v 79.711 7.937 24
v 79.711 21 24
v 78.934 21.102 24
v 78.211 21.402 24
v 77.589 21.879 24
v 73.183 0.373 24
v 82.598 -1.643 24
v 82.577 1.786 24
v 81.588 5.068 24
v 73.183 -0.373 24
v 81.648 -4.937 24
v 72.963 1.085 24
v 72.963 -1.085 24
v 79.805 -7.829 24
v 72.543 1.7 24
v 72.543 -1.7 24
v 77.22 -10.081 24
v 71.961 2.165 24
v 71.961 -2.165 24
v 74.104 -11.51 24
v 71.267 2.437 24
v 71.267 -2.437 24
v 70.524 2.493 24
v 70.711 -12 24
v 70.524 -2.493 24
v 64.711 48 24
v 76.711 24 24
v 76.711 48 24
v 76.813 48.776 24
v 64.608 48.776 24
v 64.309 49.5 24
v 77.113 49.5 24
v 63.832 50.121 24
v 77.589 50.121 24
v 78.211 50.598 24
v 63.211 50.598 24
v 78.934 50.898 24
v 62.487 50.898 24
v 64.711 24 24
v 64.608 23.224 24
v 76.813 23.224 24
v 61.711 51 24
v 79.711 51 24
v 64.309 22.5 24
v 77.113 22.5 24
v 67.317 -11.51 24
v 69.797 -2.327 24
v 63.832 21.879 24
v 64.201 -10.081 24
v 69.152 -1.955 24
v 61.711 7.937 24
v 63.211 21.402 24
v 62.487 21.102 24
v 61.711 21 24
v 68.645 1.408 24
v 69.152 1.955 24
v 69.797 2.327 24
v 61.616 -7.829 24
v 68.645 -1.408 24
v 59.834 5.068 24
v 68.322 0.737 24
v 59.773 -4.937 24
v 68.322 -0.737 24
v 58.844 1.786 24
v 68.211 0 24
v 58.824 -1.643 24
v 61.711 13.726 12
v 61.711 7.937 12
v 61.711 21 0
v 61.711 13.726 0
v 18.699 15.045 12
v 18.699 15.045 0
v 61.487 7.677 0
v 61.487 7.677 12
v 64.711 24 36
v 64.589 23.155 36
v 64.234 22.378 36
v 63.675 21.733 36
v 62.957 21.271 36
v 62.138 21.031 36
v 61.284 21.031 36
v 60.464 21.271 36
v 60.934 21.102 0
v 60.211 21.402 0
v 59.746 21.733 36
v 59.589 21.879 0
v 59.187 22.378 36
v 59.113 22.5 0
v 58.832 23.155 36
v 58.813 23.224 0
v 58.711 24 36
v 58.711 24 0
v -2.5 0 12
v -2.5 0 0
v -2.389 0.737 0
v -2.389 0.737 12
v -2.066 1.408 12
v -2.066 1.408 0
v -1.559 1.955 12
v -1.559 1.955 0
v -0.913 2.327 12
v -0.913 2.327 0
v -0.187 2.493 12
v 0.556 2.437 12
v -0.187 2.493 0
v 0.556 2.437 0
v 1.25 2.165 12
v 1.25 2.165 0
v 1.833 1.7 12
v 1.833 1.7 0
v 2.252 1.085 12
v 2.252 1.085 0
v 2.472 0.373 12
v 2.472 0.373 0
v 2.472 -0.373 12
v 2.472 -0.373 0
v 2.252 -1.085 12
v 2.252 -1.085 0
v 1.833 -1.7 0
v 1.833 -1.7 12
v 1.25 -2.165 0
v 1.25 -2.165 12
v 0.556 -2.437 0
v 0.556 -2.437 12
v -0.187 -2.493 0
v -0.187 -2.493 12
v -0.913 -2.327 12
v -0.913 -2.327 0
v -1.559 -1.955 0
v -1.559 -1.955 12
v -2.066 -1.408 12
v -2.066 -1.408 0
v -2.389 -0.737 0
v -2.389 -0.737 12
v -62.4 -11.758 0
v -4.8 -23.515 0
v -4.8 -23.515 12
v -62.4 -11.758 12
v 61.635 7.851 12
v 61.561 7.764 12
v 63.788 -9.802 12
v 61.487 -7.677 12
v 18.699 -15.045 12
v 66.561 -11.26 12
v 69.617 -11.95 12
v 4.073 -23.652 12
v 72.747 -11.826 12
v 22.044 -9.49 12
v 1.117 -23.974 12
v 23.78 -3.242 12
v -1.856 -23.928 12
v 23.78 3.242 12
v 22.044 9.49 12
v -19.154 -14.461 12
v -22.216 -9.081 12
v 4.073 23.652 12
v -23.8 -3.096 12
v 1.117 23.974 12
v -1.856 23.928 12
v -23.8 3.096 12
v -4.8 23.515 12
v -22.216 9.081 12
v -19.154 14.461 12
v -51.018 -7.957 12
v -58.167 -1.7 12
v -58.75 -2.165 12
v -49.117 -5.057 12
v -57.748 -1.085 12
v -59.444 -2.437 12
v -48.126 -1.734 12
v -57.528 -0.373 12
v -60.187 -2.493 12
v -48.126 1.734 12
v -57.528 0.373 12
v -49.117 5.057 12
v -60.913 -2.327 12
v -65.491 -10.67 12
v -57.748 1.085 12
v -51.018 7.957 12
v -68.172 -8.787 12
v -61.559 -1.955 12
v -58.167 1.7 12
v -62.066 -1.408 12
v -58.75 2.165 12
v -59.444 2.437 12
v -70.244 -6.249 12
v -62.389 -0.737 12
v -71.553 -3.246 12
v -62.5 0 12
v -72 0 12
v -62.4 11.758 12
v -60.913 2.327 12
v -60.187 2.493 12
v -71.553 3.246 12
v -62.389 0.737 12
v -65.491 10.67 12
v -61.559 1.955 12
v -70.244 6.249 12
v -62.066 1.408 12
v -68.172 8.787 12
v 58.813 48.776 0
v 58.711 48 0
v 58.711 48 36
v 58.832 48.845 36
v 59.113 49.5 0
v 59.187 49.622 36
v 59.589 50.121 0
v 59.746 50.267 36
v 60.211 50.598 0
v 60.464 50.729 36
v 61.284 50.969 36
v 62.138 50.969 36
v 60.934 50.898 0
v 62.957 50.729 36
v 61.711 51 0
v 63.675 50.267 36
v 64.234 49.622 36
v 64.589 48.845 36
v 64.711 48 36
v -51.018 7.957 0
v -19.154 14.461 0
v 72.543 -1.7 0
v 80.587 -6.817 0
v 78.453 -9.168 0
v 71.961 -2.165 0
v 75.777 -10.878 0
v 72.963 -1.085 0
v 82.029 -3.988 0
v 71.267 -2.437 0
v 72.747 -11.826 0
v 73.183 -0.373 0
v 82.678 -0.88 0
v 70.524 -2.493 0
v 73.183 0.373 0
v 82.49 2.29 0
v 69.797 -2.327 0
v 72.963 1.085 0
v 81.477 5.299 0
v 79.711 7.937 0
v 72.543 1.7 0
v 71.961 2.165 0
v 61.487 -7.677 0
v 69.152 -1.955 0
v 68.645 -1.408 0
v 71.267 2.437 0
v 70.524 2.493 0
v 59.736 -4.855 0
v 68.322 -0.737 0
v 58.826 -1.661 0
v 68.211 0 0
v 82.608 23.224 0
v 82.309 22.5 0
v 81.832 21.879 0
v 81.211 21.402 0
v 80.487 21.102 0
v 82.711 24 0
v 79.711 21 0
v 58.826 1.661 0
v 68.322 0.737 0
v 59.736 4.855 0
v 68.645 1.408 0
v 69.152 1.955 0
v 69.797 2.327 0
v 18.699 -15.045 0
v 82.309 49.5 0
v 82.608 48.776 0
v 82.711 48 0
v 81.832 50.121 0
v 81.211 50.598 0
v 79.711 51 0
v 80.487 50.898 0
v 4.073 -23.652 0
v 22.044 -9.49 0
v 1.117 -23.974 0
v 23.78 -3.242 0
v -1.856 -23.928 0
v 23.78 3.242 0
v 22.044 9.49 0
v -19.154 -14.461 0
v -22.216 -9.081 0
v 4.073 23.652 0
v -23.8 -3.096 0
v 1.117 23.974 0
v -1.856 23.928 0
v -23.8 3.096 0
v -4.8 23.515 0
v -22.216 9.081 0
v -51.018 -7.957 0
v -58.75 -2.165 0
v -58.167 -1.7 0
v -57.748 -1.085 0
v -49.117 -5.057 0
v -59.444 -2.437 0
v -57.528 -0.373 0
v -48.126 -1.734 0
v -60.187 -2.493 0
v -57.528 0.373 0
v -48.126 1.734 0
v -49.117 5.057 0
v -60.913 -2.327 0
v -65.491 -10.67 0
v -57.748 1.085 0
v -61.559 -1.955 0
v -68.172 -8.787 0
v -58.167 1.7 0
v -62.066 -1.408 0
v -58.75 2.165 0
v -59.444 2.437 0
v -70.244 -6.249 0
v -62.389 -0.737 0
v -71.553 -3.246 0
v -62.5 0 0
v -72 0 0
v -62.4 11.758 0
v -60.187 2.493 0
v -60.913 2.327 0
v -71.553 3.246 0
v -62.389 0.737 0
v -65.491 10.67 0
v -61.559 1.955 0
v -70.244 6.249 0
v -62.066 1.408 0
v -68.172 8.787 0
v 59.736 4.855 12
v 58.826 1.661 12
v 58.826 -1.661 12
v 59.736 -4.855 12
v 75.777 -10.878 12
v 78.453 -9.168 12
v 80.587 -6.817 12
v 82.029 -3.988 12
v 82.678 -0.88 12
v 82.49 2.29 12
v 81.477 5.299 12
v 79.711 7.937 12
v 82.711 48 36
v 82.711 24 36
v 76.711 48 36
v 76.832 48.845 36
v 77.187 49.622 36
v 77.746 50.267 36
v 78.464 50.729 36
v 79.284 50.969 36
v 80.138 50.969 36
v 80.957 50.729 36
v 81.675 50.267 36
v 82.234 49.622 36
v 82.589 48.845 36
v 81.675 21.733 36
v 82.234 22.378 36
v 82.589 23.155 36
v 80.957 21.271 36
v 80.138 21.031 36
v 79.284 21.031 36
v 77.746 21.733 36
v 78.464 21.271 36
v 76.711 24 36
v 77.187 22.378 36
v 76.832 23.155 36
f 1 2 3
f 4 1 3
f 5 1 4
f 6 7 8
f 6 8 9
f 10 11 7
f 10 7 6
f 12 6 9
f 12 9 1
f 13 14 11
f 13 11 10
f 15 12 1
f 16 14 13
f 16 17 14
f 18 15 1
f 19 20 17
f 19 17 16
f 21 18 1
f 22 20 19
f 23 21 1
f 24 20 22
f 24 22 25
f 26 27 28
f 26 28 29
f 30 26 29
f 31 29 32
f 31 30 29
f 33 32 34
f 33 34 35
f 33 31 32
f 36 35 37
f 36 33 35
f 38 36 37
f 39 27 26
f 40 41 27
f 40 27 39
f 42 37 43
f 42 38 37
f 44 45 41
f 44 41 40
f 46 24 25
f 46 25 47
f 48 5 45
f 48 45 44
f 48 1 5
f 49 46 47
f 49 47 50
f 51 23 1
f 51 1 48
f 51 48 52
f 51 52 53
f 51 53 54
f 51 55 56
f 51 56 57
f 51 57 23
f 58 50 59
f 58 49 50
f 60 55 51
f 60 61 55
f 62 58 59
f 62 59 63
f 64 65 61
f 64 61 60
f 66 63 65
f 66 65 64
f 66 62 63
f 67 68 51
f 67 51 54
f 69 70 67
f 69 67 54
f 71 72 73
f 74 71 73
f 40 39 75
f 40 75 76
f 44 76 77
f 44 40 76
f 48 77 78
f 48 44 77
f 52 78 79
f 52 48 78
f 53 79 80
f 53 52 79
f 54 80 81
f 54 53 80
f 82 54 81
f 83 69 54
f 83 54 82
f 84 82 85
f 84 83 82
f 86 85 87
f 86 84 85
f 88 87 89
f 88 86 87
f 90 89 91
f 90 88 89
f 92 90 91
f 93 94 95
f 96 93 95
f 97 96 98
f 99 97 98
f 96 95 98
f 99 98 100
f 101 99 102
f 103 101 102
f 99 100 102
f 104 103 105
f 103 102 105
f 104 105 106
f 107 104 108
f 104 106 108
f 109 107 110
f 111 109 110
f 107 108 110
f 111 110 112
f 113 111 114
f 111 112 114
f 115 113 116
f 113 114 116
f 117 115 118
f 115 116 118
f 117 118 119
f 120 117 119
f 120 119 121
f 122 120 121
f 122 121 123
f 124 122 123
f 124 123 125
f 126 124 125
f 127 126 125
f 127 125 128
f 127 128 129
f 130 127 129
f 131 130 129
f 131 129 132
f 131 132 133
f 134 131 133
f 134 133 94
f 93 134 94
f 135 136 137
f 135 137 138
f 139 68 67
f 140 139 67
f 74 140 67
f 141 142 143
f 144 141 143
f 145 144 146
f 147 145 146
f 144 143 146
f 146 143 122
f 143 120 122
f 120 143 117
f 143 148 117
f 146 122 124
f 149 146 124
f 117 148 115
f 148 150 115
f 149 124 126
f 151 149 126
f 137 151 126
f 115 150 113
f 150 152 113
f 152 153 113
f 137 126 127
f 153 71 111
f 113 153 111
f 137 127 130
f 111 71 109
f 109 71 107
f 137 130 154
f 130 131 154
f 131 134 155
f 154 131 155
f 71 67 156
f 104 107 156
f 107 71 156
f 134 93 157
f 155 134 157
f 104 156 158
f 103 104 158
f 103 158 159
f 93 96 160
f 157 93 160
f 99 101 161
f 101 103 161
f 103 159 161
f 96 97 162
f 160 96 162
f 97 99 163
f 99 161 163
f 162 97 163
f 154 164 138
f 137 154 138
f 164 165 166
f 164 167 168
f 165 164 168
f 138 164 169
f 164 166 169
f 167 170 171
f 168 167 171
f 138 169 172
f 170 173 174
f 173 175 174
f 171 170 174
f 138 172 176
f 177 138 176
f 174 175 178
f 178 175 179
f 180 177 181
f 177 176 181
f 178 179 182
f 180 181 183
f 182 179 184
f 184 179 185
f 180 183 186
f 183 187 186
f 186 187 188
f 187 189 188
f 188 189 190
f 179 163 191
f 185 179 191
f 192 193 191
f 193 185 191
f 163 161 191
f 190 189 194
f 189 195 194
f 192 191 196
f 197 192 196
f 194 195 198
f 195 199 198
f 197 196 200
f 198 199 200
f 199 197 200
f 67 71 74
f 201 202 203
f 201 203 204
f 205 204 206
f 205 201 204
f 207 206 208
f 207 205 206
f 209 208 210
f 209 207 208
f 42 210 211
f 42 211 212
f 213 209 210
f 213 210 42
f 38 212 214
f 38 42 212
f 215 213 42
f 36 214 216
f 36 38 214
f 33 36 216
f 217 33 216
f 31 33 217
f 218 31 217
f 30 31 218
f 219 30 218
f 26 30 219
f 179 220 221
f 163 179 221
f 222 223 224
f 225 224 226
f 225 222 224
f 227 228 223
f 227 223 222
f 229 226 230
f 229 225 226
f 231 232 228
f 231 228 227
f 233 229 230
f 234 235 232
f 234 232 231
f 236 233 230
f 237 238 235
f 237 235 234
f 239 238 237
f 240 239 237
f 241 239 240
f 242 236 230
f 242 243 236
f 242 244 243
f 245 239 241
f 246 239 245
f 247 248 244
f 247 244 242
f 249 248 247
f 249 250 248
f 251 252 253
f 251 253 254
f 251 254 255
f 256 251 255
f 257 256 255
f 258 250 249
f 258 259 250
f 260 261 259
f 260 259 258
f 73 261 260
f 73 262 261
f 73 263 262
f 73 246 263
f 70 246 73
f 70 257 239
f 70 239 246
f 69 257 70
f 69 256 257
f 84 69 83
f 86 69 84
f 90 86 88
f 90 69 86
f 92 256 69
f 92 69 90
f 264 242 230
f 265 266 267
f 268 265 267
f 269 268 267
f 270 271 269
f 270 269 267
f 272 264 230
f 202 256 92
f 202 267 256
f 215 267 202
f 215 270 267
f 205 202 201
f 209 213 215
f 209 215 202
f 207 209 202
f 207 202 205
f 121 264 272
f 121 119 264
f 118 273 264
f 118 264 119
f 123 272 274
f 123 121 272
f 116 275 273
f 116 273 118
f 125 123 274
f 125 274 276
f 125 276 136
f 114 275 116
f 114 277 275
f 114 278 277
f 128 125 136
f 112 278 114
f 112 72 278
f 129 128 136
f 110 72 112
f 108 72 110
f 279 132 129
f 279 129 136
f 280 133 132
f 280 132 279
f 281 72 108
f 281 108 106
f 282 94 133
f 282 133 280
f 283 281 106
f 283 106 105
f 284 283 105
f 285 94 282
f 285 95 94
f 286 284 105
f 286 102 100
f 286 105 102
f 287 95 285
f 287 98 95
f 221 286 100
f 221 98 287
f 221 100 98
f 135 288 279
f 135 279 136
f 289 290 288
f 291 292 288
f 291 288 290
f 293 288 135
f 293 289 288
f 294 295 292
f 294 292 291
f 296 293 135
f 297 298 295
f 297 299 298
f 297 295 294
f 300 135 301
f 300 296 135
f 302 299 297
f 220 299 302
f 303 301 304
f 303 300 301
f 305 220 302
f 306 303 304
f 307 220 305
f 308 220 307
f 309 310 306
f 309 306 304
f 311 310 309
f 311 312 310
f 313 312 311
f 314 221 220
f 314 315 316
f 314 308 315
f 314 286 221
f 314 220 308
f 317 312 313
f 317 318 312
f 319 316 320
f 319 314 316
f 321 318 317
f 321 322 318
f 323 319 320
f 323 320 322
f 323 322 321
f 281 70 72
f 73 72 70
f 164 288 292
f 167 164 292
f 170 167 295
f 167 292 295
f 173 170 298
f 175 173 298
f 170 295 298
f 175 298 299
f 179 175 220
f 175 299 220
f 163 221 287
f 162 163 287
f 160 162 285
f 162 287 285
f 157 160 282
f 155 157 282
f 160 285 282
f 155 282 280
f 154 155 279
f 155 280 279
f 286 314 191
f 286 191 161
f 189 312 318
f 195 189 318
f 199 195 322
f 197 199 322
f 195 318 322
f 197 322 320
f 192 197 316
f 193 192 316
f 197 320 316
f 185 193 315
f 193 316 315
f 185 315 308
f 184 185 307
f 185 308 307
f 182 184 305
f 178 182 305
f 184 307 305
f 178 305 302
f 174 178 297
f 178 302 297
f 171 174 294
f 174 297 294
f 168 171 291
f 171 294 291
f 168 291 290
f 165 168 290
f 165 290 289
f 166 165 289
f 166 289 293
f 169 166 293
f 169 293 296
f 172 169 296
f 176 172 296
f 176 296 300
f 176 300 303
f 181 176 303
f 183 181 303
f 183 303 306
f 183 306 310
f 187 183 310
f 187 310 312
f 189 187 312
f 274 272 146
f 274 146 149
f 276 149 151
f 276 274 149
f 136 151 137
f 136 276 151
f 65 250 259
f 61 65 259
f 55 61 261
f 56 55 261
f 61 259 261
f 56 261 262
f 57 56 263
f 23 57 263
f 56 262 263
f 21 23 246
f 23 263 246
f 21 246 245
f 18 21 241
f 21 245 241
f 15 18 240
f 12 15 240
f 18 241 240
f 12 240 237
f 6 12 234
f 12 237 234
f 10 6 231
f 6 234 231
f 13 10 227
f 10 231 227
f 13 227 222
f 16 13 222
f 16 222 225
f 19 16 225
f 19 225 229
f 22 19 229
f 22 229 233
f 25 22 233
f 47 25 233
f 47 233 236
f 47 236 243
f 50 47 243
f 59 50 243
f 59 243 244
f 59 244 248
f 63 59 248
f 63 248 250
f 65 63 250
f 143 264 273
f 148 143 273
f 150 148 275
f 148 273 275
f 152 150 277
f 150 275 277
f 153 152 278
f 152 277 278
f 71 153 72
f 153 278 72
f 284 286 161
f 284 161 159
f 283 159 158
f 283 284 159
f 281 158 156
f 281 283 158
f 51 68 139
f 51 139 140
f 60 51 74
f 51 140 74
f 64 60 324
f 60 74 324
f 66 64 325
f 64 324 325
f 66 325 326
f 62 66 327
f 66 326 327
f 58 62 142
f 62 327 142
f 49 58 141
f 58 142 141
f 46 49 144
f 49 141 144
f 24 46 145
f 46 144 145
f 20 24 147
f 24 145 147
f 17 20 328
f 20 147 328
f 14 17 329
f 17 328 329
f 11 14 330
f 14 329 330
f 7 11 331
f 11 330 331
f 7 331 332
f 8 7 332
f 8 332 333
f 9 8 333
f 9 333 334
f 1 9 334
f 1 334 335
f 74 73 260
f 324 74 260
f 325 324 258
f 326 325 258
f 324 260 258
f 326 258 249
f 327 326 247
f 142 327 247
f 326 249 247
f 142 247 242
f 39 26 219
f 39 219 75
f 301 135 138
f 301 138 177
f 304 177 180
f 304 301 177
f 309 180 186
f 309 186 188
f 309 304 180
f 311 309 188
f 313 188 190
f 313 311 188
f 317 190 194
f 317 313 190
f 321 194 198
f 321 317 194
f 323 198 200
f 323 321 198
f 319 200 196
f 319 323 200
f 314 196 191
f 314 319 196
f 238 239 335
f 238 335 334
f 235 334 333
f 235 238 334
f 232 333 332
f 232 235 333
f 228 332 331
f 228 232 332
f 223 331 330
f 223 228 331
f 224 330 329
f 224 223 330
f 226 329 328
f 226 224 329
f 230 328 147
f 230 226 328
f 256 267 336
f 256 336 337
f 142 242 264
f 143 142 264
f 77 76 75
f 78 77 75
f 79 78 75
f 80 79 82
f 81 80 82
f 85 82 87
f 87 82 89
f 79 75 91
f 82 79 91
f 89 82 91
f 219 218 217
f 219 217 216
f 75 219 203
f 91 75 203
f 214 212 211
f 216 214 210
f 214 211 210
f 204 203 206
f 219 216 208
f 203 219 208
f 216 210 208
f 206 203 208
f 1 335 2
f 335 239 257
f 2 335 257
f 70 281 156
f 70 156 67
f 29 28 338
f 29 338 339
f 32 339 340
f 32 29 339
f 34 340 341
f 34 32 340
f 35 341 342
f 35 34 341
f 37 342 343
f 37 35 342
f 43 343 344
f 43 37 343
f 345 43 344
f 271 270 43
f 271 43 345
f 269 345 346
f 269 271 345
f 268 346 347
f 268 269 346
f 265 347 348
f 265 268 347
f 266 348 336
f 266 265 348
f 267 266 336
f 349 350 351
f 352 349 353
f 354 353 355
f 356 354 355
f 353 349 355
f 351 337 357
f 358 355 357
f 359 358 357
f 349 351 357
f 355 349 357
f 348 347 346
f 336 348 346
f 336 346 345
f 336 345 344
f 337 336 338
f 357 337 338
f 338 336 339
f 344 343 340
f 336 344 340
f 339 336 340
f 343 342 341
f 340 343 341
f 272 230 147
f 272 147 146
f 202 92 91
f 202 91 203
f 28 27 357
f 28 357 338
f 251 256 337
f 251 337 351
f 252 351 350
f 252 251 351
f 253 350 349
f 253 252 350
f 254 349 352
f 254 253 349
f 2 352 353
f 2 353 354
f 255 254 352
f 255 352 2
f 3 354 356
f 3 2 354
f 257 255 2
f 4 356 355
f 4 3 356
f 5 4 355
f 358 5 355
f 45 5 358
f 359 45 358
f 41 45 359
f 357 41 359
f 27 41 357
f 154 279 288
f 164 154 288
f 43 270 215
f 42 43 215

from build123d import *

# Parameters (mm, degrees)
BOSS_EXTRUDE1_DEPTH   = 12
SKETCH5_R             = 12
BOSS_EXTRUDE2_DEPTH   = 12
M6_TAPPED_HOLE1_D     = 5
BOSS_EXTRUDE3_START   = -24
BOSS_EXTRUDE3_DEPTH   = 36
BOSS_EXTRUDE3_2_DEPTH = 36
BOSS_EXTRUDE4_REACH   = 105.625
SKETCH7_W             = 18
SKETCH7_H             = 43.323398588


with BuildPart() as part:
    # Sketch1 → Boss-Extrude1 (new body)
    with BuildSketch(Plane.XY):
        with BuildLine():
            Line((-62.4, 11.757550765), (-4.8, 23.515101531))
            ThreePointArc((-4.8, 23.515101531), (-0.369908928, 23.997149151), (4.07293506, 23.65187519))
            Line((4.07293506, 23.65187519), (72.747145648, 11.825937595))
            ThreePointArc((72.747145648, 11.825937595), (82.710678119, 0), (72.747145648, -11.825937595))
            Line((72.747145648, -11.825937595), (4.07293506, -23.65187519))
            ThreePointArc((4.07293506, -23.65187519), (-0.369908928, -23.997149151), (-4.8, -23.515101531))
            Line((-4.8, -23.515101531), (-62.4, -11.757550765))
            ThreePointArc((-62.4, -11.757550765), (-72, 0), (-62.4, 11.757550765))
        make_face()
        with BuildLine():
            Line((-51.017662351, 7.957236352), (-19.153777676, 14.461424575))
            ThreePointArc((-19.153777676, 14.461424575), (-24, 0), (-19.153777676, -14.461424575))
            Line((-19.153777676, -14.461424575), (-51.017662351, -7.957236352))
            ThreePointArc((-51.017662351, -7.957236352), (-48, 0), (-51.017662351, 7.957236352))
        make_face(mode=Mode.SUBTRACT)
        with BuildLine():
            Line((18.698946243, 15.044913074), (61.487349503, 7.676601412))
            ThreePointArc((61.487349503, 7.676601412), (58.710678119, 0), (61.487349503, -7.676601412))
            Line((61.487349503, -7.676601412), (18.698946243, -15.044913074))
            ThreePointArc((18.698946243, -15.044913074), (24, 0), (18.698946243, 15.044913074))
        make_face(mode=Mode.SUBTRACT)
    extrude(amount=BOSS_EXTRUDE1_DEPTH)

    # Sketch5 → Boss-Extrude2 (add)
    with BuildSketch(Plane.XY.offset(12)):
        with Locations(Location((70.710678119, 0, 0), (0, 0, 140.229295936))):
            Circle(SKETCH5_R)
    extrude(amount=BOSS_EXTRUDE2_DEPTH)

    # M6 Tapped Hole1 (through all)
    with Locations(Plane.XY.offset(24)):
        with Locations((-60, 0), (0, 0), (70.710678119, 0)):
            Hole(M6_TAPPED_HOLE1_D / 2)

    # Boss-Extrude4: up to this face of the body (flat: up to its plane)
    boss_extrude4_end = Plane(part.part.faces().sort_by_distance((79.673131606, -7.459474336, 24))[0])
    # Sketch7 → Boss-Extrude4 (add, up to the picked face)
    with BuildSketch(Plane(origin=(0, 0, 0), x_dir=(-1, 0, 0), z_dir=(0, 0, -1)), mode=Mode.PRIVATE) as boss_extrude4_sk1:
        with Locations((-70.710678119, 29.338300706)):
            Rectangle(SKETCH7_W, SKETCH7_H)
    boss_extrude4_tool1 = split(extrude(boss_extrude4_sk1.sketch, amount=-BOSS_EXTRUDE4_REACH, mode=Mode.PRIVATE), bisect_by=boss_extrude4_end, keep=Keep.BOTH, mode=Mode.PRIVATE)


with BuildPart() as body_2:
    # Sketch6 → Boss-Extrude3 (new body)
    with BuildSketch(Plane.XY.offset(24).offset(BOSS_EXTRUDE3_START)):
        with BuildLine():
            Line((76.710678119, 24), (76.710678119, 48))
            ThreePointArc((76.710678119, 48), (79.710678119, 51), (82.710678119, 48))
            Line((82.710678119, 48), (82.710678119, 24))
            ThreePointArc((82.710678119, 24), (79.710678119, 21), (76.710678119, 24))
        make_face()
    extrude(amount=BOSS_EXTRUDE3_DEPTH)


with BuildPart() as body_3:
    # Sketch6 → Boss-Extrude3 2 (new body)
    with BuildSketch(Plane.XY.offset(24).offset(BOSS_EXTRUDE3_START)):
        with BuildLine():
            Line((58.710678119, 24), (58.710678119, 48))
            ThreePointArc((58.710678119, 48), (61.710678119, 51), (64.710678119, 48))
            Line((64.710678119, 48), (64.710678119, 24))
            ThreePointArc((64.710678119, 24), (61.710678119, 21), (58.710678119, 24))
        make_face()
    extrude(amount=BOSS_EXTRUDE3_2_DEPTH)


with BuildPart() as part_1:
    add(part.part)

    add(body_2.part)  # Boss-Extrude4 merges body 2

    add(body_3.part)  # Boss-Extrude4 merges body 3
    add(boss_extrude4_tool1.solids().sort_by(Axis((70.710678, 29.338301, 0), (0, 0, 1)))[0])


solid = part_1.part
